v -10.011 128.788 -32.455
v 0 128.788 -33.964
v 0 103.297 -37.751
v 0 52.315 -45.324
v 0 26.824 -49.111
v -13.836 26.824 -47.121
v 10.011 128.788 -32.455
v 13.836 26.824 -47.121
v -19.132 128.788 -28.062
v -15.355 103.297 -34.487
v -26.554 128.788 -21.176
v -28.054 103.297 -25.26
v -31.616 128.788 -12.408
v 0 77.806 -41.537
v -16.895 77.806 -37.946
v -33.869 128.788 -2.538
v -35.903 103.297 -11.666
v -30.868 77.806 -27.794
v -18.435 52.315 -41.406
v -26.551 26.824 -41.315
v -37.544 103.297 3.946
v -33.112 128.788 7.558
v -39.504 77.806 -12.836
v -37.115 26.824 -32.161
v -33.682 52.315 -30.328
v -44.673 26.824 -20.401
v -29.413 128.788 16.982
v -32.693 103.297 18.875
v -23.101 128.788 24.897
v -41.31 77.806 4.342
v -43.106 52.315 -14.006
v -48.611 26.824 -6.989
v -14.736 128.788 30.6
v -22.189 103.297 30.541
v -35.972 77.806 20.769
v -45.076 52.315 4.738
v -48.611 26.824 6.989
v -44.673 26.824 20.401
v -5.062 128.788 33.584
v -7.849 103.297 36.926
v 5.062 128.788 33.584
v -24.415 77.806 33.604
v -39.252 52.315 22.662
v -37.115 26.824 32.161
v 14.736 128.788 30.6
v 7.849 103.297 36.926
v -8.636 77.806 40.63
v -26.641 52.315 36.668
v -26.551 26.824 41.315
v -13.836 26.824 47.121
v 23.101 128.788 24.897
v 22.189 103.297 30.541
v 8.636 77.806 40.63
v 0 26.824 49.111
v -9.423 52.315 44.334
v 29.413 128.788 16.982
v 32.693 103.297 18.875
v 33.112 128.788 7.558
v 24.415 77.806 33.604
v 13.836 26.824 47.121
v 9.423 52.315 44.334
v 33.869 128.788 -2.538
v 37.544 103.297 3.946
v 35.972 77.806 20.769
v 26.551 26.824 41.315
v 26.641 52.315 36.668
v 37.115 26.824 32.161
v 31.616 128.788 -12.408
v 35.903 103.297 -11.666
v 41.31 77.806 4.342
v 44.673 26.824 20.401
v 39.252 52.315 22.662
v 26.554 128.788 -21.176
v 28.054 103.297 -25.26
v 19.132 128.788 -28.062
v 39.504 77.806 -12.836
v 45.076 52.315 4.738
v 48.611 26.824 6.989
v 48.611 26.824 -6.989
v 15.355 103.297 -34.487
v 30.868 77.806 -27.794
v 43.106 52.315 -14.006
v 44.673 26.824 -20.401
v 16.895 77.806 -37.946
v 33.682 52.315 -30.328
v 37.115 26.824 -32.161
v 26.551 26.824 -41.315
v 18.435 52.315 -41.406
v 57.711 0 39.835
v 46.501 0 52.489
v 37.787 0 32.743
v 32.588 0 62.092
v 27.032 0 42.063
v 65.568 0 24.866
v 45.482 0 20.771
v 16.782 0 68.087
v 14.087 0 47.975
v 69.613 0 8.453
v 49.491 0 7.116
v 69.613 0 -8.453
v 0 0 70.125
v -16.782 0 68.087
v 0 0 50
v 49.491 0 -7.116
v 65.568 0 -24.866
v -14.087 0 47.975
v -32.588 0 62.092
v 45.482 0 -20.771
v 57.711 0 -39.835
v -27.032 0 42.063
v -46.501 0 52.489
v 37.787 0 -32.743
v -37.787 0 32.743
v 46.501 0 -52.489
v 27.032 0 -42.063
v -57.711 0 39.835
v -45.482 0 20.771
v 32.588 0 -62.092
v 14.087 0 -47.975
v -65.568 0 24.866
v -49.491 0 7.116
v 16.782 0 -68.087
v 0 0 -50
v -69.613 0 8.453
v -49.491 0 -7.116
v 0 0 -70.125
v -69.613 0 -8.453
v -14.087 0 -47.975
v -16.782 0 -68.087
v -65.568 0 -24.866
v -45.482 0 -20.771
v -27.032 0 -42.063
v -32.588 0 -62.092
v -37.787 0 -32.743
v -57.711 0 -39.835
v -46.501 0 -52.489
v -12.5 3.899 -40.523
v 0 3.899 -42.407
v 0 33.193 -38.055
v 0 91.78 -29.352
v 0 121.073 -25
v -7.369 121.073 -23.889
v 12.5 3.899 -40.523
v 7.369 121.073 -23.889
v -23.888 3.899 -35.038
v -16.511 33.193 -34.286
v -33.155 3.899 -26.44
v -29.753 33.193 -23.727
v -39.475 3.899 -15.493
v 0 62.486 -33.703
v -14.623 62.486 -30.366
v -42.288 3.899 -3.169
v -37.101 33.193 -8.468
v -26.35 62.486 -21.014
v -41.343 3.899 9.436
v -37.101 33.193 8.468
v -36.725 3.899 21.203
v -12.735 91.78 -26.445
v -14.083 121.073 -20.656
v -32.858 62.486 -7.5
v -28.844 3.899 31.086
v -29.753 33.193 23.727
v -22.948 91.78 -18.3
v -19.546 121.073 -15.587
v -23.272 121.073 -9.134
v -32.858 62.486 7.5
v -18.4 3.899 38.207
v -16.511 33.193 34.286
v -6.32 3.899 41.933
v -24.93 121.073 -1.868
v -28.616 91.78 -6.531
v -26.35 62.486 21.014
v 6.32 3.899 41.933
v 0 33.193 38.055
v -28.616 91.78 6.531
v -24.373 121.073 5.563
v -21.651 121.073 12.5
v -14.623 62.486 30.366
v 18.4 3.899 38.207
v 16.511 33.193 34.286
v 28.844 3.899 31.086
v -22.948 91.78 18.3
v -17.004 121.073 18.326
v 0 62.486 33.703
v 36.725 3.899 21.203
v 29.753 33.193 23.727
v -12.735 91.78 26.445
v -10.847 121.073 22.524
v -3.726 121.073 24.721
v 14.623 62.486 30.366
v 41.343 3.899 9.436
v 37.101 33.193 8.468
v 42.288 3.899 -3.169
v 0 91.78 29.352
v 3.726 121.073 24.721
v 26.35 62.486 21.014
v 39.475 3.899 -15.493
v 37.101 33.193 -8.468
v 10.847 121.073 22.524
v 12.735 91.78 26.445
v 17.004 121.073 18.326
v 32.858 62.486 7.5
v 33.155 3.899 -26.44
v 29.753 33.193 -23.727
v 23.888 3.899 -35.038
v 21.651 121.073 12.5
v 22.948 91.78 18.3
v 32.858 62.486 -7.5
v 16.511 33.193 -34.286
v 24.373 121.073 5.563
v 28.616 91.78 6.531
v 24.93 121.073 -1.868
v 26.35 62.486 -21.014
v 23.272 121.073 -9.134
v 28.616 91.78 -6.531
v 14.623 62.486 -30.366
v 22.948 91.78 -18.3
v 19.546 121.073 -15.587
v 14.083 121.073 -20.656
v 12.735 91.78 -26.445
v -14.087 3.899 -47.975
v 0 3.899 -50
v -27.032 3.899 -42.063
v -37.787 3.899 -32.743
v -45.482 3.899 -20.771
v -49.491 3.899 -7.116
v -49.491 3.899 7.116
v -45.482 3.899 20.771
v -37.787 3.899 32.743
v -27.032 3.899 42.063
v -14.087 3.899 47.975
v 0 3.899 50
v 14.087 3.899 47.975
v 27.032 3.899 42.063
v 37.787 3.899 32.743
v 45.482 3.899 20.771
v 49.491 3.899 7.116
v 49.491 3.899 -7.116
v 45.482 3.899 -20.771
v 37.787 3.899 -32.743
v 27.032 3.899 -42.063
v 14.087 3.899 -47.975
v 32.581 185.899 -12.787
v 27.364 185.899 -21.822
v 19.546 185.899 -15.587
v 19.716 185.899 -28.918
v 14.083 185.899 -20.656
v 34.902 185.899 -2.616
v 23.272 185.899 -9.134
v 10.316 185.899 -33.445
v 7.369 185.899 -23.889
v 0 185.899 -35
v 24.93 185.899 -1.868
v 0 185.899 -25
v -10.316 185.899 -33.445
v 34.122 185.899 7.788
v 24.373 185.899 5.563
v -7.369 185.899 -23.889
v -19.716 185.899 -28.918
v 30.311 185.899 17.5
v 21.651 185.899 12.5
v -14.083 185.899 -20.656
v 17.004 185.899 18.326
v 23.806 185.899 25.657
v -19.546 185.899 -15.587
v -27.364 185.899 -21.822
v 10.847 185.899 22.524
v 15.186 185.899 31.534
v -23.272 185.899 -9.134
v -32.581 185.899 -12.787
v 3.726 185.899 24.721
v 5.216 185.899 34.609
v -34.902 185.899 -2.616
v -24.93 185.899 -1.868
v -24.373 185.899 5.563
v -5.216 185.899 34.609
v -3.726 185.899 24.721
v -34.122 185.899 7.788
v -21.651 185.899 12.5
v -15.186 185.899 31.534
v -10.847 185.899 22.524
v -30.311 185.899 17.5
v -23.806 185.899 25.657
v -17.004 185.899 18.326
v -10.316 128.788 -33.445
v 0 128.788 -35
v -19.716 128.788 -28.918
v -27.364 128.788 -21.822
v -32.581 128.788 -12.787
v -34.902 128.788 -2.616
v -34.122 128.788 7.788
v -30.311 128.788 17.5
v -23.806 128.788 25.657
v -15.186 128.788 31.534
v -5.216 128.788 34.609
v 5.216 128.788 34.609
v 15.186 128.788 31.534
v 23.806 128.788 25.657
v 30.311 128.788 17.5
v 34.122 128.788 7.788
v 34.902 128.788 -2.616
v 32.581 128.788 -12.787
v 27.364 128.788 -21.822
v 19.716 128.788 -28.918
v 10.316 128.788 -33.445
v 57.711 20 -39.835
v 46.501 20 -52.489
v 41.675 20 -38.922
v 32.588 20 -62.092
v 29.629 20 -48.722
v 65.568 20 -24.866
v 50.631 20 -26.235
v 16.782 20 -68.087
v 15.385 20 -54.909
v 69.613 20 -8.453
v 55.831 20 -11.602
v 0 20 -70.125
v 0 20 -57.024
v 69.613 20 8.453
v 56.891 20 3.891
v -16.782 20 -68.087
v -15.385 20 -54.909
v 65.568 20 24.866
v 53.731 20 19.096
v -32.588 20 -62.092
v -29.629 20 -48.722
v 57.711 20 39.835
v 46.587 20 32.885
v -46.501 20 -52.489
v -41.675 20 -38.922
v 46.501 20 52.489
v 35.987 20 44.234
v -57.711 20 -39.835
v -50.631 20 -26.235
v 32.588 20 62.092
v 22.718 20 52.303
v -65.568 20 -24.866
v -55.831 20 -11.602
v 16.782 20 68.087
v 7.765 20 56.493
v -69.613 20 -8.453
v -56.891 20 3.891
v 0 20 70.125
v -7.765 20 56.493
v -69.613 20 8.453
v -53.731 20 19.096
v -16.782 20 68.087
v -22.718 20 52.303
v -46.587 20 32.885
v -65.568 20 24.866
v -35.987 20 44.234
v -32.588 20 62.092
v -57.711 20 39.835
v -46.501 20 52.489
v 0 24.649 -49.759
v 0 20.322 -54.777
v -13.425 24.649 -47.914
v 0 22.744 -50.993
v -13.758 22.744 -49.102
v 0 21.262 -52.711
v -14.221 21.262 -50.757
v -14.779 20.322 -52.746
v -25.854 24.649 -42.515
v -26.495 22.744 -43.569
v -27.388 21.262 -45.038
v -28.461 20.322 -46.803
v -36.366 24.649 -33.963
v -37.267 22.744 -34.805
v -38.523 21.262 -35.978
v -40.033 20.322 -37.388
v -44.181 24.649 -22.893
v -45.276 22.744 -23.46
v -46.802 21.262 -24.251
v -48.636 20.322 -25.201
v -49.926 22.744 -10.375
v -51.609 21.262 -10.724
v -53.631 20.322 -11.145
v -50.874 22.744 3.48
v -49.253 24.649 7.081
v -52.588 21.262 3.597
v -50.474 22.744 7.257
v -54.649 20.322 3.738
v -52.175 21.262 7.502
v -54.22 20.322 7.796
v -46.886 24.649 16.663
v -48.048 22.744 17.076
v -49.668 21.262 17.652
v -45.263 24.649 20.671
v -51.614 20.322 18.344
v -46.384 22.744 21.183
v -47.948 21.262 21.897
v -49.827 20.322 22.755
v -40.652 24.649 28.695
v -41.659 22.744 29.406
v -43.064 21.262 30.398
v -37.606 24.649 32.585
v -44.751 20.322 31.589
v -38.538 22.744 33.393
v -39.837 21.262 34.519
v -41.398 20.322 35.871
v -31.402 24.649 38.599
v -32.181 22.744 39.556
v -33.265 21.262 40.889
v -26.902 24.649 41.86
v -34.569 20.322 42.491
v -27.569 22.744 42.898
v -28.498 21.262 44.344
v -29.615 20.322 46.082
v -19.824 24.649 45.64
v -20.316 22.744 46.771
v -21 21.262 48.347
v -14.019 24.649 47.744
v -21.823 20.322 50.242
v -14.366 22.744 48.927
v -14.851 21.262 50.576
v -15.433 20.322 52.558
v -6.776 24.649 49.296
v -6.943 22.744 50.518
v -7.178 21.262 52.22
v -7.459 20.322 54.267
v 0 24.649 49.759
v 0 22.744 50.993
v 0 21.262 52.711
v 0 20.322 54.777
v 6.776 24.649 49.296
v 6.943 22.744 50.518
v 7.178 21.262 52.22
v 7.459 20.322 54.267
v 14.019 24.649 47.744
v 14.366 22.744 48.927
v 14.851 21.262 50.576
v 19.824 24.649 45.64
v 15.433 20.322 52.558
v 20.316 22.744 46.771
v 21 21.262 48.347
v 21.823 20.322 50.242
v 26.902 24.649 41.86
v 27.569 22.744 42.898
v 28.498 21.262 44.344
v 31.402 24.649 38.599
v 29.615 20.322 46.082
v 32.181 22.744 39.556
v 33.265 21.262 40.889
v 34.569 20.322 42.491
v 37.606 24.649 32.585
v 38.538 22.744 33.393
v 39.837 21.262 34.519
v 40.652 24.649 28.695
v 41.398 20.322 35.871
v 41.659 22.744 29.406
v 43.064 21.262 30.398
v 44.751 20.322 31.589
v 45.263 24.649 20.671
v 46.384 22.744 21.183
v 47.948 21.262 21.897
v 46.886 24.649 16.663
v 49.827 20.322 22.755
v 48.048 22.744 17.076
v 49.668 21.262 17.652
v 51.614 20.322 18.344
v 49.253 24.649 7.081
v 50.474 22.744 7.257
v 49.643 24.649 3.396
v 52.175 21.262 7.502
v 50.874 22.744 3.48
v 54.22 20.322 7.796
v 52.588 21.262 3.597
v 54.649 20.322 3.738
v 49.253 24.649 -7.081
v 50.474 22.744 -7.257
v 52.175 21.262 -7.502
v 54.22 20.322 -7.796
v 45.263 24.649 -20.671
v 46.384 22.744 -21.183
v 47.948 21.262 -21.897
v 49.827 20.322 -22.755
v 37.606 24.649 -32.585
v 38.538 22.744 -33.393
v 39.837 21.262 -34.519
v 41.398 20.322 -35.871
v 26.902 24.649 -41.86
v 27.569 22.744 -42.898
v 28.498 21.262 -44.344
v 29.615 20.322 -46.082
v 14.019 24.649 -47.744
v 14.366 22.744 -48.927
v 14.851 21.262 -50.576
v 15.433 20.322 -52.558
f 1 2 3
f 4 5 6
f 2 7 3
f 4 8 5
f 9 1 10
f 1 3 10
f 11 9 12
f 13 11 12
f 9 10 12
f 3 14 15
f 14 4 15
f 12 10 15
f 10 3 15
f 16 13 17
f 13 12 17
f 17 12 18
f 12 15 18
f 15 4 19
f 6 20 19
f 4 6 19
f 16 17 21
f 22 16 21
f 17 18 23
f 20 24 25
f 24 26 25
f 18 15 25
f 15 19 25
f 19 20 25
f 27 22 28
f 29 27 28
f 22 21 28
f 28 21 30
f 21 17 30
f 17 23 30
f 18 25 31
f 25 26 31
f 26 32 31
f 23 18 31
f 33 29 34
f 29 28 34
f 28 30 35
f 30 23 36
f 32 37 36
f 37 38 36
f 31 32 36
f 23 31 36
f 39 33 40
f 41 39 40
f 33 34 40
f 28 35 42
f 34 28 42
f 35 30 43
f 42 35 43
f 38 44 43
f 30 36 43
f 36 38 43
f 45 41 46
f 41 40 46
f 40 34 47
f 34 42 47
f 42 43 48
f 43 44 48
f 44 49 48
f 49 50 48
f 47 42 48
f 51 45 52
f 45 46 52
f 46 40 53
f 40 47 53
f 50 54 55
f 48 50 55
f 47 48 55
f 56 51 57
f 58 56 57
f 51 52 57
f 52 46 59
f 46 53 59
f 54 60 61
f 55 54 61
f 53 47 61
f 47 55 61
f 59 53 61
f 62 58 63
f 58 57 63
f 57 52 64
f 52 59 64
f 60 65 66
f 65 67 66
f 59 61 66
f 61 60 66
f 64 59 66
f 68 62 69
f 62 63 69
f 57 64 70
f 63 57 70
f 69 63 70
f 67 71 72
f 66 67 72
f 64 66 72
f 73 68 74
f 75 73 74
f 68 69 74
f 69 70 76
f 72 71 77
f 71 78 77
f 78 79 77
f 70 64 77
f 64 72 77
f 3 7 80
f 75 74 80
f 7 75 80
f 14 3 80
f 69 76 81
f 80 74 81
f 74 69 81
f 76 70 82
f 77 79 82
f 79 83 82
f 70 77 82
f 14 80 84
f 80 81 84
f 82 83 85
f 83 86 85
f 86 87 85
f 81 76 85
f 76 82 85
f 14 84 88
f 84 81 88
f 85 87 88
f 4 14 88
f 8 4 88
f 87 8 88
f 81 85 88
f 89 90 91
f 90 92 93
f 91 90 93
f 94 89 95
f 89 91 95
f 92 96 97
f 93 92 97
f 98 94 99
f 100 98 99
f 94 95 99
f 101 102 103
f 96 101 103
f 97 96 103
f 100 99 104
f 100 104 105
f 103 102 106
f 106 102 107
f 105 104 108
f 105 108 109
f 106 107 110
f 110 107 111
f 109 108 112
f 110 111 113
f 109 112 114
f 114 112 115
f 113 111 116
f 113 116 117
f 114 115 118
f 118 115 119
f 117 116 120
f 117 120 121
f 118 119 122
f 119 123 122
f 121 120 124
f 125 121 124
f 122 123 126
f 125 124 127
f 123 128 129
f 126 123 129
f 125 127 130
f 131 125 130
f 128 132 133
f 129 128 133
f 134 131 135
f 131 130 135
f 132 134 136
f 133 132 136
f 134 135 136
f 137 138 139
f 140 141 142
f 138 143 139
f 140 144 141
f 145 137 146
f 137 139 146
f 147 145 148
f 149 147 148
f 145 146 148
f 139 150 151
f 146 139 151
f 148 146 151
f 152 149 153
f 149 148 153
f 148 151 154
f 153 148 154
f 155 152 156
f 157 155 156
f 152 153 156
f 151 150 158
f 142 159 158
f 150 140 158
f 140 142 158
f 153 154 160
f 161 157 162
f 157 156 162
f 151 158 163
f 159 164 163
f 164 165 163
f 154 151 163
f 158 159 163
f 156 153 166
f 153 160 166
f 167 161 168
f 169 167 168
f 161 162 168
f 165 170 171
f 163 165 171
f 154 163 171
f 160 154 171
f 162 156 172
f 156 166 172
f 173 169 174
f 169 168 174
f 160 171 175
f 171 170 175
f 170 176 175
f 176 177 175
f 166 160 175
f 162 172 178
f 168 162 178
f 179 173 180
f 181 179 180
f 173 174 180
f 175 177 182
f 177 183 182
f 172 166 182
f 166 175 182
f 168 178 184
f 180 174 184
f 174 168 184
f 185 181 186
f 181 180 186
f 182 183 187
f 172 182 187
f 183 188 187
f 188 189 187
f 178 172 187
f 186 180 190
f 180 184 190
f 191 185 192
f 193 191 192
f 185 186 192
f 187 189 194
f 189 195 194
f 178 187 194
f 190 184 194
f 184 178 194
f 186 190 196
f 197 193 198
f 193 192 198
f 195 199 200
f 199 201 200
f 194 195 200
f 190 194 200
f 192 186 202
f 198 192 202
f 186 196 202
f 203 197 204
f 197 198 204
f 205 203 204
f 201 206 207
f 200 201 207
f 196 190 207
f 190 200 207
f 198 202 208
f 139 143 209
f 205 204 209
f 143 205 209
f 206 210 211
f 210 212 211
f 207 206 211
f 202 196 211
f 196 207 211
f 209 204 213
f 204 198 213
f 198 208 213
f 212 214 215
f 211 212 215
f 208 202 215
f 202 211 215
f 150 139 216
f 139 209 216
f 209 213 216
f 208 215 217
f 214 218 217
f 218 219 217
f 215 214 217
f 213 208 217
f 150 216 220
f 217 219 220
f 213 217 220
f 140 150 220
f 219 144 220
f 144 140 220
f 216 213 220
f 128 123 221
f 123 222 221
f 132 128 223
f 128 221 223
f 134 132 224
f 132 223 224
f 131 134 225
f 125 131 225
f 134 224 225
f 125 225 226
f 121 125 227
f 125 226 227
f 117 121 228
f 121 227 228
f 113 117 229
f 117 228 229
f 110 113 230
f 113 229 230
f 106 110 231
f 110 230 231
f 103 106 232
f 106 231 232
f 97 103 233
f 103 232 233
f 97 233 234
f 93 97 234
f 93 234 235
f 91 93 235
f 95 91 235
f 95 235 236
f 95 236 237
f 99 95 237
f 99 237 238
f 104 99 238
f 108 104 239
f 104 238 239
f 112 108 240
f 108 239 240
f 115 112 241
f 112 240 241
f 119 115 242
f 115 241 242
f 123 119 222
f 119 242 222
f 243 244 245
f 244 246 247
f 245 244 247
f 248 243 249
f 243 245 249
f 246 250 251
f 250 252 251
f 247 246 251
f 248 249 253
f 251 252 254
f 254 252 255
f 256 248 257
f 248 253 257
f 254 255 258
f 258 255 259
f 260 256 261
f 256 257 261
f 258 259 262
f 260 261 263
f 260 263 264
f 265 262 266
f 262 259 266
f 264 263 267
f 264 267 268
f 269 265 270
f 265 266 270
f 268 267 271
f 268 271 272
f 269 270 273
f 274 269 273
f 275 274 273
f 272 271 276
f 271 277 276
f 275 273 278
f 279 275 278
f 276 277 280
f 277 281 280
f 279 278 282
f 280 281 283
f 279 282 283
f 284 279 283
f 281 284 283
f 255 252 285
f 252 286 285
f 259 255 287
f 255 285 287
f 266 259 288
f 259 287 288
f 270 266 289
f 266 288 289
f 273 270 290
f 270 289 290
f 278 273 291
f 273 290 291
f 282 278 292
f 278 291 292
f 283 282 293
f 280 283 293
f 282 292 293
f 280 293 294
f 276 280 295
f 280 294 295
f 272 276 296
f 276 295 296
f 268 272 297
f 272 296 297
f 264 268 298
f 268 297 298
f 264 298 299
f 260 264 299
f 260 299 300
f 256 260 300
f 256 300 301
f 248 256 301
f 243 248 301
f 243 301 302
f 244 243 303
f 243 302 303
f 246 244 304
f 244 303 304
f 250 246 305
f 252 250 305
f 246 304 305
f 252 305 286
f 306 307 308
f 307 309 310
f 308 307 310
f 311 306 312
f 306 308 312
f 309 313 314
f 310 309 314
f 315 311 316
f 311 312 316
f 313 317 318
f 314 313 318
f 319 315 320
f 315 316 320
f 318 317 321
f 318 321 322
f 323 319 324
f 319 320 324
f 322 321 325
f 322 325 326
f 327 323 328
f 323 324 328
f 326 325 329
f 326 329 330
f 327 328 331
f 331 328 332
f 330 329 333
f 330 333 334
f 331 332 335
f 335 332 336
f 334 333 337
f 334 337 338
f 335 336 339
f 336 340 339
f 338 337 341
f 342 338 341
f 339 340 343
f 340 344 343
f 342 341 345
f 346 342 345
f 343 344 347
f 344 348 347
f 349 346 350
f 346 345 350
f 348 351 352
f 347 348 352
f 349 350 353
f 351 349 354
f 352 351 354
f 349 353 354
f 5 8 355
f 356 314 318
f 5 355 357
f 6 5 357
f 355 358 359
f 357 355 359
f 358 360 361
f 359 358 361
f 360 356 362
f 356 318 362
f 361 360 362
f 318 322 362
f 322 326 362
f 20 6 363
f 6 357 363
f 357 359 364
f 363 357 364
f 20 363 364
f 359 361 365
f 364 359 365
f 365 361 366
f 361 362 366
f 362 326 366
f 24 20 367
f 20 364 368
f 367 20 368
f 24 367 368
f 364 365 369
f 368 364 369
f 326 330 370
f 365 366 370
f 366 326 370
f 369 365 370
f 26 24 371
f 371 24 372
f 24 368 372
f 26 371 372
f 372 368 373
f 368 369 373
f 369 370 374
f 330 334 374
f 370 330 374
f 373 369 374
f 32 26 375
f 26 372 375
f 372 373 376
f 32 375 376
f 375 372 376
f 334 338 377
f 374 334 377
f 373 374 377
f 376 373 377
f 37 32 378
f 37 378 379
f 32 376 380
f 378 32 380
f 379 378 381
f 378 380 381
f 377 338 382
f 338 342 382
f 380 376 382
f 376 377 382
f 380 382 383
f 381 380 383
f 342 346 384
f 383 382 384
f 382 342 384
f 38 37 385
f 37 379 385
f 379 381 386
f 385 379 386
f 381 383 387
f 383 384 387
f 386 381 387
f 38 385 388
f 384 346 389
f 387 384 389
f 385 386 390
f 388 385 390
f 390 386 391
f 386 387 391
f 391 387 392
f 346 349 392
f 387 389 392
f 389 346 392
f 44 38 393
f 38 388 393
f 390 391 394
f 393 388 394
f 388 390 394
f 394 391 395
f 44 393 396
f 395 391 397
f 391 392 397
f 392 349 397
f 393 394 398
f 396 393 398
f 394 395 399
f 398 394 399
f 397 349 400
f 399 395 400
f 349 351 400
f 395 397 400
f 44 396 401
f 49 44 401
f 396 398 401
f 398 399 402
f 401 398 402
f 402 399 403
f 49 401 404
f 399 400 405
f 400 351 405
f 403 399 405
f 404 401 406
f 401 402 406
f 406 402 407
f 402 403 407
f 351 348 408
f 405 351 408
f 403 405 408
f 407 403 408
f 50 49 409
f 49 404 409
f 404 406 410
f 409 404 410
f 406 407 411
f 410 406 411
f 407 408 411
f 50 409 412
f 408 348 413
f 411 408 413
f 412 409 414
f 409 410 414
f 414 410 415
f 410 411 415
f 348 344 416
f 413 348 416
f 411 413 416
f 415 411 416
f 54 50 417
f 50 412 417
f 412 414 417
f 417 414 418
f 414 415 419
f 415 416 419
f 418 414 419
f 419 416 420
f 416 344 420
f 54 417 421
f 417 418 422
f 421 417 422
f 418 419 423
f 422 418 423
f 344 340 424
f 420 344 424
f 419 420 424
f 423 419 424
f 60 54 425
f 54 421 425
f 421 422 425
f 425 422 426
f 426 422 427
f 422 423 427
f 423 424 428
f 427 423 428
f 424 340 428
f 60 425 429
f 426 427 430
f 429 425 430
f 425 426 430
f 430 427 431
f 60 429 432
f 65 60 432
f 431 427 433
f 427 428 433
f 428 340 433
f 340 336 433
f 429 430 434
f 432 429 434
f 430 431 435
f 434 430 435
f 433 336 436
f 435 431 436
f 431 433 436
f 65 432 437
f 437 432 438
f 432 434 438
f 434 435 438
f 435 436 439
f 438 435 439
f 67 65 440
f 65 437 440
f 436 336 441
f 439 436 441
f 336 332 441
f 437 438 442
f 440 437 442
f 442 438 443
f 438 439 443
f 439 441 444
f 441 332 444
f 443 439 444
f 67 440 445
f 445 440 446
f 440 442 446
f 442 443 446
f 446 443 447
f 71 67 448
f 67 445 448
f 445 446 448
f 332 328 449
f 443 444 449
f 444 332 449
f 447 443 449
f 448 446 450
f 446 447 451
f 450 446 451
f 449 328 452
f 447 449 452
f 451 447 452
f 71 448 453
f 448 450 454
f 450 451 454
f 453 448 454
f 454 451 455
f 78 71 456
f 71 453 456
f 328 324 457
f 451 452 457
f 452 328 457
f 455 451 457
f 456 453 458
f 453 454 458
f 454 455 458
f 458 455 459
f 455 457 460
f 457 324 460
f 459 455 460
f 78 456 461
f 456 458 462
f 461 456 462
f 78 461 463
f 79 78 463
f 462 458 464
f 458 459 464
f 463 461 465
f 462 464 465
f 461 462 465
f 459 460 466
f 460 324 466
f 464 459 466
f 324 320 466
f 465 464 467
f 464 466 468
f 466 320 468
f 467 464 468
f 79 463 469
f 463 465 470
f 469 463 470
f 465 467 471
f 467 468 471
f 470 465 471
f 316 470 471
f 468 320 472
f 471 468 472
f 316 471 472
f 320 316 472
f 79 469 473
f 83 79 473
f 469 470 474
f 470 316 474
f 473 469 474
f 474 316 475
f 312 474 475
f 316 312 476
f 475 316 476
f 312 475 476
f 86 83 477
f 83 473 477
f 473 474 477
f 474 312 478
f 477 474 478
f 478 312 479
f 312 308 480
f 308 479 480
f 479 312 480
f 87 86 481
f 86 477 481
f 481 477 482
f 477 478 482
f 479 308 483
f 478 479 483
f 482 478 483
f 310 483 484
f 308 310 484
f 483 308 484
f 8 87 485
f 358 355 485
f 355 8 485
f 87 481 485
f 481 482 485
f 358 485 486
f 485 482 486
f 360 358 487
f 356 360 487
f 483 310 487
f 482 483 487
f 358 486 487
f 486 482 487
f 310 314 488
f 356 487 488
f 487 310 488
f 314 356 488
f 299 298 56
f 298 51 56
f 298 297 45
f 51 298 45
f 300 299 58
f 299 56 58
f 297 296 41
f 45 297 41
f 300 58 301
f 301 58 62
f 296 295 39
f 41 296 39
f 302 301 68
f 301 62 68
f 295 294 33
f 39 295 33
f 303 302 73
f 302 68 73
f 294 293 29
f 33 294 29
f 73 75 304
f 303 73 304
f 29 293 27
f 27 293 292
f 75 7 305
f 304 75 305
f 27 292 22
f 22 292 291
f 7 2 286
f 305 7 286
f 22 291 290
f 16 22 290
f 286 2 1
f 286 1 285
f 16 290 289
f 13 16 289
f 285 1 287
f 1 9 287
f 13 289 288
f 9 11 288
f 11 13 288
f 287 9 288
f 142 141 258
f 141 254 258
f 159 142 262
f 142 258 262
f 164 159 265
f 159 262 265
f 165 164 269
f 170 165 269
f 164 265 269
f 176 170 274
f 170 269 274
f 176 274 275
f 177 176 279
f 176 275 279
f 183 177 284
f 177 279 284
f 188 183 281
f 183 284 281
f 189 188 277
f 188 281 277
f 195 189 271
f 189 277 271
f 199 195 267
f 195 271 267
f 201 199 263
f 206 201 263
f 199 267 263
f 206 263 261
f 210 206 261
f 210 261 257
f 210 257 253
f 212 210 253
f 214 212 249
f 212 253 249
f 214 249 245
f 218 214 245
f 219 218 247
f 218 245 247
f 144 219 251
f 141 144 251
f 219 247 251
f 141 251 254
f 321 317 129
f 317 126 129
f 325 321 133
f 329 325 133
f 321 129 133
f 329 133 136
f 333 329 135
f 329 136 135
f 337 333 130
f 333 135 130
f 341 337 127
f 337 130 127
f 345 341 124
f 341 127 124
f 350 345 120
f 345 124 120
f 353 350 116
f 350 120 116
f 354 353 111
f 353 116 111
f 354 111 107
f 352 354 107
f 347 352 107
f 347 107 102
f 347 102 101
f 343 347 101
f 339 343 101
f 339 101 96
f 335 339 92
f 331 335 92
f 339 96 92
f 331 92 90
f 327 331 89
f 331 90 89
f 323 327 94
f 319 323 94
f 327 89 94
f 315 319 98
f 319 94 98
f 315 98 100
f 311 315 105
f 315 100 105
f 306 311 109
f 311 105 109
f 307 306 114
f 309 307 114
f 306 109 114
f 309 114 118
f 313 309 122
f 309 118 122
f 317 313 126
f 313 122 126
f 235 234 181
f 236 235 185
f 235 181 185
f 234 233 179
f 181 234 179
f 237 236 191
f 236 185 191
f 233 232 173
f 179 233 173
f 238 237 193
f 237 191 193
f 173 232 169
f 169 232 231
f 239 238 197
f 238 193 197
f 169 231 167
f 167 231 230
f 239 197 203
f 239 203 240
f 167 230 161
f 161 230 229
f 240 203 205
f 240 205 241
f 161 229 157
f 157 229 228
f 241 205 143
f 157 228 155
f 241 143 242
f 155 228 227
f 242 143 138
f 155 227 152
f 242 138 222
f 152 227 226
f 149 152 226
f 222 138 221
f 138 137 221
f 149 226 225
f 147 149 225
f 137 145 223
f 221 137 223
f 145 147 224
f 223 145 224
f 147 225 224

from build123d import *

# Parameters (mm, degrees)
FILLET1_R = 8


with BuildPart() as part:
    # Sketch3 → Revolve1 (revolve)
    with BuildSketch(Plane.XY, mode=Mode.PRIVATE) as revolve1_sk:
        Polygon((25, 185.89945678), (35, 185.89945678), (35, 128.787624663), (33.963762469, 128.787624663), (50.124510314, 20), (70.124510314, 20), (70.124510314, 0), (50, 0), (50, 3.89945678), (42.40655913, 3.89945678), (25, 121.073379639), align=None)
    revolve(revolve1_sk.sketch.rotate(Axis((0, 0, 0), (0, 1, 0)), 90), axis=Axis((0, 0, 0), (0, 1, 0)))

    # Fillet1
    fillet1_edges = [part.edges().sort_by_distance(p)[0] for p in [
        (0, 20, 50.124510314),
    ]]
    fillet(fillet1_edges, radius=FILLET1_R)


solid = part.part
